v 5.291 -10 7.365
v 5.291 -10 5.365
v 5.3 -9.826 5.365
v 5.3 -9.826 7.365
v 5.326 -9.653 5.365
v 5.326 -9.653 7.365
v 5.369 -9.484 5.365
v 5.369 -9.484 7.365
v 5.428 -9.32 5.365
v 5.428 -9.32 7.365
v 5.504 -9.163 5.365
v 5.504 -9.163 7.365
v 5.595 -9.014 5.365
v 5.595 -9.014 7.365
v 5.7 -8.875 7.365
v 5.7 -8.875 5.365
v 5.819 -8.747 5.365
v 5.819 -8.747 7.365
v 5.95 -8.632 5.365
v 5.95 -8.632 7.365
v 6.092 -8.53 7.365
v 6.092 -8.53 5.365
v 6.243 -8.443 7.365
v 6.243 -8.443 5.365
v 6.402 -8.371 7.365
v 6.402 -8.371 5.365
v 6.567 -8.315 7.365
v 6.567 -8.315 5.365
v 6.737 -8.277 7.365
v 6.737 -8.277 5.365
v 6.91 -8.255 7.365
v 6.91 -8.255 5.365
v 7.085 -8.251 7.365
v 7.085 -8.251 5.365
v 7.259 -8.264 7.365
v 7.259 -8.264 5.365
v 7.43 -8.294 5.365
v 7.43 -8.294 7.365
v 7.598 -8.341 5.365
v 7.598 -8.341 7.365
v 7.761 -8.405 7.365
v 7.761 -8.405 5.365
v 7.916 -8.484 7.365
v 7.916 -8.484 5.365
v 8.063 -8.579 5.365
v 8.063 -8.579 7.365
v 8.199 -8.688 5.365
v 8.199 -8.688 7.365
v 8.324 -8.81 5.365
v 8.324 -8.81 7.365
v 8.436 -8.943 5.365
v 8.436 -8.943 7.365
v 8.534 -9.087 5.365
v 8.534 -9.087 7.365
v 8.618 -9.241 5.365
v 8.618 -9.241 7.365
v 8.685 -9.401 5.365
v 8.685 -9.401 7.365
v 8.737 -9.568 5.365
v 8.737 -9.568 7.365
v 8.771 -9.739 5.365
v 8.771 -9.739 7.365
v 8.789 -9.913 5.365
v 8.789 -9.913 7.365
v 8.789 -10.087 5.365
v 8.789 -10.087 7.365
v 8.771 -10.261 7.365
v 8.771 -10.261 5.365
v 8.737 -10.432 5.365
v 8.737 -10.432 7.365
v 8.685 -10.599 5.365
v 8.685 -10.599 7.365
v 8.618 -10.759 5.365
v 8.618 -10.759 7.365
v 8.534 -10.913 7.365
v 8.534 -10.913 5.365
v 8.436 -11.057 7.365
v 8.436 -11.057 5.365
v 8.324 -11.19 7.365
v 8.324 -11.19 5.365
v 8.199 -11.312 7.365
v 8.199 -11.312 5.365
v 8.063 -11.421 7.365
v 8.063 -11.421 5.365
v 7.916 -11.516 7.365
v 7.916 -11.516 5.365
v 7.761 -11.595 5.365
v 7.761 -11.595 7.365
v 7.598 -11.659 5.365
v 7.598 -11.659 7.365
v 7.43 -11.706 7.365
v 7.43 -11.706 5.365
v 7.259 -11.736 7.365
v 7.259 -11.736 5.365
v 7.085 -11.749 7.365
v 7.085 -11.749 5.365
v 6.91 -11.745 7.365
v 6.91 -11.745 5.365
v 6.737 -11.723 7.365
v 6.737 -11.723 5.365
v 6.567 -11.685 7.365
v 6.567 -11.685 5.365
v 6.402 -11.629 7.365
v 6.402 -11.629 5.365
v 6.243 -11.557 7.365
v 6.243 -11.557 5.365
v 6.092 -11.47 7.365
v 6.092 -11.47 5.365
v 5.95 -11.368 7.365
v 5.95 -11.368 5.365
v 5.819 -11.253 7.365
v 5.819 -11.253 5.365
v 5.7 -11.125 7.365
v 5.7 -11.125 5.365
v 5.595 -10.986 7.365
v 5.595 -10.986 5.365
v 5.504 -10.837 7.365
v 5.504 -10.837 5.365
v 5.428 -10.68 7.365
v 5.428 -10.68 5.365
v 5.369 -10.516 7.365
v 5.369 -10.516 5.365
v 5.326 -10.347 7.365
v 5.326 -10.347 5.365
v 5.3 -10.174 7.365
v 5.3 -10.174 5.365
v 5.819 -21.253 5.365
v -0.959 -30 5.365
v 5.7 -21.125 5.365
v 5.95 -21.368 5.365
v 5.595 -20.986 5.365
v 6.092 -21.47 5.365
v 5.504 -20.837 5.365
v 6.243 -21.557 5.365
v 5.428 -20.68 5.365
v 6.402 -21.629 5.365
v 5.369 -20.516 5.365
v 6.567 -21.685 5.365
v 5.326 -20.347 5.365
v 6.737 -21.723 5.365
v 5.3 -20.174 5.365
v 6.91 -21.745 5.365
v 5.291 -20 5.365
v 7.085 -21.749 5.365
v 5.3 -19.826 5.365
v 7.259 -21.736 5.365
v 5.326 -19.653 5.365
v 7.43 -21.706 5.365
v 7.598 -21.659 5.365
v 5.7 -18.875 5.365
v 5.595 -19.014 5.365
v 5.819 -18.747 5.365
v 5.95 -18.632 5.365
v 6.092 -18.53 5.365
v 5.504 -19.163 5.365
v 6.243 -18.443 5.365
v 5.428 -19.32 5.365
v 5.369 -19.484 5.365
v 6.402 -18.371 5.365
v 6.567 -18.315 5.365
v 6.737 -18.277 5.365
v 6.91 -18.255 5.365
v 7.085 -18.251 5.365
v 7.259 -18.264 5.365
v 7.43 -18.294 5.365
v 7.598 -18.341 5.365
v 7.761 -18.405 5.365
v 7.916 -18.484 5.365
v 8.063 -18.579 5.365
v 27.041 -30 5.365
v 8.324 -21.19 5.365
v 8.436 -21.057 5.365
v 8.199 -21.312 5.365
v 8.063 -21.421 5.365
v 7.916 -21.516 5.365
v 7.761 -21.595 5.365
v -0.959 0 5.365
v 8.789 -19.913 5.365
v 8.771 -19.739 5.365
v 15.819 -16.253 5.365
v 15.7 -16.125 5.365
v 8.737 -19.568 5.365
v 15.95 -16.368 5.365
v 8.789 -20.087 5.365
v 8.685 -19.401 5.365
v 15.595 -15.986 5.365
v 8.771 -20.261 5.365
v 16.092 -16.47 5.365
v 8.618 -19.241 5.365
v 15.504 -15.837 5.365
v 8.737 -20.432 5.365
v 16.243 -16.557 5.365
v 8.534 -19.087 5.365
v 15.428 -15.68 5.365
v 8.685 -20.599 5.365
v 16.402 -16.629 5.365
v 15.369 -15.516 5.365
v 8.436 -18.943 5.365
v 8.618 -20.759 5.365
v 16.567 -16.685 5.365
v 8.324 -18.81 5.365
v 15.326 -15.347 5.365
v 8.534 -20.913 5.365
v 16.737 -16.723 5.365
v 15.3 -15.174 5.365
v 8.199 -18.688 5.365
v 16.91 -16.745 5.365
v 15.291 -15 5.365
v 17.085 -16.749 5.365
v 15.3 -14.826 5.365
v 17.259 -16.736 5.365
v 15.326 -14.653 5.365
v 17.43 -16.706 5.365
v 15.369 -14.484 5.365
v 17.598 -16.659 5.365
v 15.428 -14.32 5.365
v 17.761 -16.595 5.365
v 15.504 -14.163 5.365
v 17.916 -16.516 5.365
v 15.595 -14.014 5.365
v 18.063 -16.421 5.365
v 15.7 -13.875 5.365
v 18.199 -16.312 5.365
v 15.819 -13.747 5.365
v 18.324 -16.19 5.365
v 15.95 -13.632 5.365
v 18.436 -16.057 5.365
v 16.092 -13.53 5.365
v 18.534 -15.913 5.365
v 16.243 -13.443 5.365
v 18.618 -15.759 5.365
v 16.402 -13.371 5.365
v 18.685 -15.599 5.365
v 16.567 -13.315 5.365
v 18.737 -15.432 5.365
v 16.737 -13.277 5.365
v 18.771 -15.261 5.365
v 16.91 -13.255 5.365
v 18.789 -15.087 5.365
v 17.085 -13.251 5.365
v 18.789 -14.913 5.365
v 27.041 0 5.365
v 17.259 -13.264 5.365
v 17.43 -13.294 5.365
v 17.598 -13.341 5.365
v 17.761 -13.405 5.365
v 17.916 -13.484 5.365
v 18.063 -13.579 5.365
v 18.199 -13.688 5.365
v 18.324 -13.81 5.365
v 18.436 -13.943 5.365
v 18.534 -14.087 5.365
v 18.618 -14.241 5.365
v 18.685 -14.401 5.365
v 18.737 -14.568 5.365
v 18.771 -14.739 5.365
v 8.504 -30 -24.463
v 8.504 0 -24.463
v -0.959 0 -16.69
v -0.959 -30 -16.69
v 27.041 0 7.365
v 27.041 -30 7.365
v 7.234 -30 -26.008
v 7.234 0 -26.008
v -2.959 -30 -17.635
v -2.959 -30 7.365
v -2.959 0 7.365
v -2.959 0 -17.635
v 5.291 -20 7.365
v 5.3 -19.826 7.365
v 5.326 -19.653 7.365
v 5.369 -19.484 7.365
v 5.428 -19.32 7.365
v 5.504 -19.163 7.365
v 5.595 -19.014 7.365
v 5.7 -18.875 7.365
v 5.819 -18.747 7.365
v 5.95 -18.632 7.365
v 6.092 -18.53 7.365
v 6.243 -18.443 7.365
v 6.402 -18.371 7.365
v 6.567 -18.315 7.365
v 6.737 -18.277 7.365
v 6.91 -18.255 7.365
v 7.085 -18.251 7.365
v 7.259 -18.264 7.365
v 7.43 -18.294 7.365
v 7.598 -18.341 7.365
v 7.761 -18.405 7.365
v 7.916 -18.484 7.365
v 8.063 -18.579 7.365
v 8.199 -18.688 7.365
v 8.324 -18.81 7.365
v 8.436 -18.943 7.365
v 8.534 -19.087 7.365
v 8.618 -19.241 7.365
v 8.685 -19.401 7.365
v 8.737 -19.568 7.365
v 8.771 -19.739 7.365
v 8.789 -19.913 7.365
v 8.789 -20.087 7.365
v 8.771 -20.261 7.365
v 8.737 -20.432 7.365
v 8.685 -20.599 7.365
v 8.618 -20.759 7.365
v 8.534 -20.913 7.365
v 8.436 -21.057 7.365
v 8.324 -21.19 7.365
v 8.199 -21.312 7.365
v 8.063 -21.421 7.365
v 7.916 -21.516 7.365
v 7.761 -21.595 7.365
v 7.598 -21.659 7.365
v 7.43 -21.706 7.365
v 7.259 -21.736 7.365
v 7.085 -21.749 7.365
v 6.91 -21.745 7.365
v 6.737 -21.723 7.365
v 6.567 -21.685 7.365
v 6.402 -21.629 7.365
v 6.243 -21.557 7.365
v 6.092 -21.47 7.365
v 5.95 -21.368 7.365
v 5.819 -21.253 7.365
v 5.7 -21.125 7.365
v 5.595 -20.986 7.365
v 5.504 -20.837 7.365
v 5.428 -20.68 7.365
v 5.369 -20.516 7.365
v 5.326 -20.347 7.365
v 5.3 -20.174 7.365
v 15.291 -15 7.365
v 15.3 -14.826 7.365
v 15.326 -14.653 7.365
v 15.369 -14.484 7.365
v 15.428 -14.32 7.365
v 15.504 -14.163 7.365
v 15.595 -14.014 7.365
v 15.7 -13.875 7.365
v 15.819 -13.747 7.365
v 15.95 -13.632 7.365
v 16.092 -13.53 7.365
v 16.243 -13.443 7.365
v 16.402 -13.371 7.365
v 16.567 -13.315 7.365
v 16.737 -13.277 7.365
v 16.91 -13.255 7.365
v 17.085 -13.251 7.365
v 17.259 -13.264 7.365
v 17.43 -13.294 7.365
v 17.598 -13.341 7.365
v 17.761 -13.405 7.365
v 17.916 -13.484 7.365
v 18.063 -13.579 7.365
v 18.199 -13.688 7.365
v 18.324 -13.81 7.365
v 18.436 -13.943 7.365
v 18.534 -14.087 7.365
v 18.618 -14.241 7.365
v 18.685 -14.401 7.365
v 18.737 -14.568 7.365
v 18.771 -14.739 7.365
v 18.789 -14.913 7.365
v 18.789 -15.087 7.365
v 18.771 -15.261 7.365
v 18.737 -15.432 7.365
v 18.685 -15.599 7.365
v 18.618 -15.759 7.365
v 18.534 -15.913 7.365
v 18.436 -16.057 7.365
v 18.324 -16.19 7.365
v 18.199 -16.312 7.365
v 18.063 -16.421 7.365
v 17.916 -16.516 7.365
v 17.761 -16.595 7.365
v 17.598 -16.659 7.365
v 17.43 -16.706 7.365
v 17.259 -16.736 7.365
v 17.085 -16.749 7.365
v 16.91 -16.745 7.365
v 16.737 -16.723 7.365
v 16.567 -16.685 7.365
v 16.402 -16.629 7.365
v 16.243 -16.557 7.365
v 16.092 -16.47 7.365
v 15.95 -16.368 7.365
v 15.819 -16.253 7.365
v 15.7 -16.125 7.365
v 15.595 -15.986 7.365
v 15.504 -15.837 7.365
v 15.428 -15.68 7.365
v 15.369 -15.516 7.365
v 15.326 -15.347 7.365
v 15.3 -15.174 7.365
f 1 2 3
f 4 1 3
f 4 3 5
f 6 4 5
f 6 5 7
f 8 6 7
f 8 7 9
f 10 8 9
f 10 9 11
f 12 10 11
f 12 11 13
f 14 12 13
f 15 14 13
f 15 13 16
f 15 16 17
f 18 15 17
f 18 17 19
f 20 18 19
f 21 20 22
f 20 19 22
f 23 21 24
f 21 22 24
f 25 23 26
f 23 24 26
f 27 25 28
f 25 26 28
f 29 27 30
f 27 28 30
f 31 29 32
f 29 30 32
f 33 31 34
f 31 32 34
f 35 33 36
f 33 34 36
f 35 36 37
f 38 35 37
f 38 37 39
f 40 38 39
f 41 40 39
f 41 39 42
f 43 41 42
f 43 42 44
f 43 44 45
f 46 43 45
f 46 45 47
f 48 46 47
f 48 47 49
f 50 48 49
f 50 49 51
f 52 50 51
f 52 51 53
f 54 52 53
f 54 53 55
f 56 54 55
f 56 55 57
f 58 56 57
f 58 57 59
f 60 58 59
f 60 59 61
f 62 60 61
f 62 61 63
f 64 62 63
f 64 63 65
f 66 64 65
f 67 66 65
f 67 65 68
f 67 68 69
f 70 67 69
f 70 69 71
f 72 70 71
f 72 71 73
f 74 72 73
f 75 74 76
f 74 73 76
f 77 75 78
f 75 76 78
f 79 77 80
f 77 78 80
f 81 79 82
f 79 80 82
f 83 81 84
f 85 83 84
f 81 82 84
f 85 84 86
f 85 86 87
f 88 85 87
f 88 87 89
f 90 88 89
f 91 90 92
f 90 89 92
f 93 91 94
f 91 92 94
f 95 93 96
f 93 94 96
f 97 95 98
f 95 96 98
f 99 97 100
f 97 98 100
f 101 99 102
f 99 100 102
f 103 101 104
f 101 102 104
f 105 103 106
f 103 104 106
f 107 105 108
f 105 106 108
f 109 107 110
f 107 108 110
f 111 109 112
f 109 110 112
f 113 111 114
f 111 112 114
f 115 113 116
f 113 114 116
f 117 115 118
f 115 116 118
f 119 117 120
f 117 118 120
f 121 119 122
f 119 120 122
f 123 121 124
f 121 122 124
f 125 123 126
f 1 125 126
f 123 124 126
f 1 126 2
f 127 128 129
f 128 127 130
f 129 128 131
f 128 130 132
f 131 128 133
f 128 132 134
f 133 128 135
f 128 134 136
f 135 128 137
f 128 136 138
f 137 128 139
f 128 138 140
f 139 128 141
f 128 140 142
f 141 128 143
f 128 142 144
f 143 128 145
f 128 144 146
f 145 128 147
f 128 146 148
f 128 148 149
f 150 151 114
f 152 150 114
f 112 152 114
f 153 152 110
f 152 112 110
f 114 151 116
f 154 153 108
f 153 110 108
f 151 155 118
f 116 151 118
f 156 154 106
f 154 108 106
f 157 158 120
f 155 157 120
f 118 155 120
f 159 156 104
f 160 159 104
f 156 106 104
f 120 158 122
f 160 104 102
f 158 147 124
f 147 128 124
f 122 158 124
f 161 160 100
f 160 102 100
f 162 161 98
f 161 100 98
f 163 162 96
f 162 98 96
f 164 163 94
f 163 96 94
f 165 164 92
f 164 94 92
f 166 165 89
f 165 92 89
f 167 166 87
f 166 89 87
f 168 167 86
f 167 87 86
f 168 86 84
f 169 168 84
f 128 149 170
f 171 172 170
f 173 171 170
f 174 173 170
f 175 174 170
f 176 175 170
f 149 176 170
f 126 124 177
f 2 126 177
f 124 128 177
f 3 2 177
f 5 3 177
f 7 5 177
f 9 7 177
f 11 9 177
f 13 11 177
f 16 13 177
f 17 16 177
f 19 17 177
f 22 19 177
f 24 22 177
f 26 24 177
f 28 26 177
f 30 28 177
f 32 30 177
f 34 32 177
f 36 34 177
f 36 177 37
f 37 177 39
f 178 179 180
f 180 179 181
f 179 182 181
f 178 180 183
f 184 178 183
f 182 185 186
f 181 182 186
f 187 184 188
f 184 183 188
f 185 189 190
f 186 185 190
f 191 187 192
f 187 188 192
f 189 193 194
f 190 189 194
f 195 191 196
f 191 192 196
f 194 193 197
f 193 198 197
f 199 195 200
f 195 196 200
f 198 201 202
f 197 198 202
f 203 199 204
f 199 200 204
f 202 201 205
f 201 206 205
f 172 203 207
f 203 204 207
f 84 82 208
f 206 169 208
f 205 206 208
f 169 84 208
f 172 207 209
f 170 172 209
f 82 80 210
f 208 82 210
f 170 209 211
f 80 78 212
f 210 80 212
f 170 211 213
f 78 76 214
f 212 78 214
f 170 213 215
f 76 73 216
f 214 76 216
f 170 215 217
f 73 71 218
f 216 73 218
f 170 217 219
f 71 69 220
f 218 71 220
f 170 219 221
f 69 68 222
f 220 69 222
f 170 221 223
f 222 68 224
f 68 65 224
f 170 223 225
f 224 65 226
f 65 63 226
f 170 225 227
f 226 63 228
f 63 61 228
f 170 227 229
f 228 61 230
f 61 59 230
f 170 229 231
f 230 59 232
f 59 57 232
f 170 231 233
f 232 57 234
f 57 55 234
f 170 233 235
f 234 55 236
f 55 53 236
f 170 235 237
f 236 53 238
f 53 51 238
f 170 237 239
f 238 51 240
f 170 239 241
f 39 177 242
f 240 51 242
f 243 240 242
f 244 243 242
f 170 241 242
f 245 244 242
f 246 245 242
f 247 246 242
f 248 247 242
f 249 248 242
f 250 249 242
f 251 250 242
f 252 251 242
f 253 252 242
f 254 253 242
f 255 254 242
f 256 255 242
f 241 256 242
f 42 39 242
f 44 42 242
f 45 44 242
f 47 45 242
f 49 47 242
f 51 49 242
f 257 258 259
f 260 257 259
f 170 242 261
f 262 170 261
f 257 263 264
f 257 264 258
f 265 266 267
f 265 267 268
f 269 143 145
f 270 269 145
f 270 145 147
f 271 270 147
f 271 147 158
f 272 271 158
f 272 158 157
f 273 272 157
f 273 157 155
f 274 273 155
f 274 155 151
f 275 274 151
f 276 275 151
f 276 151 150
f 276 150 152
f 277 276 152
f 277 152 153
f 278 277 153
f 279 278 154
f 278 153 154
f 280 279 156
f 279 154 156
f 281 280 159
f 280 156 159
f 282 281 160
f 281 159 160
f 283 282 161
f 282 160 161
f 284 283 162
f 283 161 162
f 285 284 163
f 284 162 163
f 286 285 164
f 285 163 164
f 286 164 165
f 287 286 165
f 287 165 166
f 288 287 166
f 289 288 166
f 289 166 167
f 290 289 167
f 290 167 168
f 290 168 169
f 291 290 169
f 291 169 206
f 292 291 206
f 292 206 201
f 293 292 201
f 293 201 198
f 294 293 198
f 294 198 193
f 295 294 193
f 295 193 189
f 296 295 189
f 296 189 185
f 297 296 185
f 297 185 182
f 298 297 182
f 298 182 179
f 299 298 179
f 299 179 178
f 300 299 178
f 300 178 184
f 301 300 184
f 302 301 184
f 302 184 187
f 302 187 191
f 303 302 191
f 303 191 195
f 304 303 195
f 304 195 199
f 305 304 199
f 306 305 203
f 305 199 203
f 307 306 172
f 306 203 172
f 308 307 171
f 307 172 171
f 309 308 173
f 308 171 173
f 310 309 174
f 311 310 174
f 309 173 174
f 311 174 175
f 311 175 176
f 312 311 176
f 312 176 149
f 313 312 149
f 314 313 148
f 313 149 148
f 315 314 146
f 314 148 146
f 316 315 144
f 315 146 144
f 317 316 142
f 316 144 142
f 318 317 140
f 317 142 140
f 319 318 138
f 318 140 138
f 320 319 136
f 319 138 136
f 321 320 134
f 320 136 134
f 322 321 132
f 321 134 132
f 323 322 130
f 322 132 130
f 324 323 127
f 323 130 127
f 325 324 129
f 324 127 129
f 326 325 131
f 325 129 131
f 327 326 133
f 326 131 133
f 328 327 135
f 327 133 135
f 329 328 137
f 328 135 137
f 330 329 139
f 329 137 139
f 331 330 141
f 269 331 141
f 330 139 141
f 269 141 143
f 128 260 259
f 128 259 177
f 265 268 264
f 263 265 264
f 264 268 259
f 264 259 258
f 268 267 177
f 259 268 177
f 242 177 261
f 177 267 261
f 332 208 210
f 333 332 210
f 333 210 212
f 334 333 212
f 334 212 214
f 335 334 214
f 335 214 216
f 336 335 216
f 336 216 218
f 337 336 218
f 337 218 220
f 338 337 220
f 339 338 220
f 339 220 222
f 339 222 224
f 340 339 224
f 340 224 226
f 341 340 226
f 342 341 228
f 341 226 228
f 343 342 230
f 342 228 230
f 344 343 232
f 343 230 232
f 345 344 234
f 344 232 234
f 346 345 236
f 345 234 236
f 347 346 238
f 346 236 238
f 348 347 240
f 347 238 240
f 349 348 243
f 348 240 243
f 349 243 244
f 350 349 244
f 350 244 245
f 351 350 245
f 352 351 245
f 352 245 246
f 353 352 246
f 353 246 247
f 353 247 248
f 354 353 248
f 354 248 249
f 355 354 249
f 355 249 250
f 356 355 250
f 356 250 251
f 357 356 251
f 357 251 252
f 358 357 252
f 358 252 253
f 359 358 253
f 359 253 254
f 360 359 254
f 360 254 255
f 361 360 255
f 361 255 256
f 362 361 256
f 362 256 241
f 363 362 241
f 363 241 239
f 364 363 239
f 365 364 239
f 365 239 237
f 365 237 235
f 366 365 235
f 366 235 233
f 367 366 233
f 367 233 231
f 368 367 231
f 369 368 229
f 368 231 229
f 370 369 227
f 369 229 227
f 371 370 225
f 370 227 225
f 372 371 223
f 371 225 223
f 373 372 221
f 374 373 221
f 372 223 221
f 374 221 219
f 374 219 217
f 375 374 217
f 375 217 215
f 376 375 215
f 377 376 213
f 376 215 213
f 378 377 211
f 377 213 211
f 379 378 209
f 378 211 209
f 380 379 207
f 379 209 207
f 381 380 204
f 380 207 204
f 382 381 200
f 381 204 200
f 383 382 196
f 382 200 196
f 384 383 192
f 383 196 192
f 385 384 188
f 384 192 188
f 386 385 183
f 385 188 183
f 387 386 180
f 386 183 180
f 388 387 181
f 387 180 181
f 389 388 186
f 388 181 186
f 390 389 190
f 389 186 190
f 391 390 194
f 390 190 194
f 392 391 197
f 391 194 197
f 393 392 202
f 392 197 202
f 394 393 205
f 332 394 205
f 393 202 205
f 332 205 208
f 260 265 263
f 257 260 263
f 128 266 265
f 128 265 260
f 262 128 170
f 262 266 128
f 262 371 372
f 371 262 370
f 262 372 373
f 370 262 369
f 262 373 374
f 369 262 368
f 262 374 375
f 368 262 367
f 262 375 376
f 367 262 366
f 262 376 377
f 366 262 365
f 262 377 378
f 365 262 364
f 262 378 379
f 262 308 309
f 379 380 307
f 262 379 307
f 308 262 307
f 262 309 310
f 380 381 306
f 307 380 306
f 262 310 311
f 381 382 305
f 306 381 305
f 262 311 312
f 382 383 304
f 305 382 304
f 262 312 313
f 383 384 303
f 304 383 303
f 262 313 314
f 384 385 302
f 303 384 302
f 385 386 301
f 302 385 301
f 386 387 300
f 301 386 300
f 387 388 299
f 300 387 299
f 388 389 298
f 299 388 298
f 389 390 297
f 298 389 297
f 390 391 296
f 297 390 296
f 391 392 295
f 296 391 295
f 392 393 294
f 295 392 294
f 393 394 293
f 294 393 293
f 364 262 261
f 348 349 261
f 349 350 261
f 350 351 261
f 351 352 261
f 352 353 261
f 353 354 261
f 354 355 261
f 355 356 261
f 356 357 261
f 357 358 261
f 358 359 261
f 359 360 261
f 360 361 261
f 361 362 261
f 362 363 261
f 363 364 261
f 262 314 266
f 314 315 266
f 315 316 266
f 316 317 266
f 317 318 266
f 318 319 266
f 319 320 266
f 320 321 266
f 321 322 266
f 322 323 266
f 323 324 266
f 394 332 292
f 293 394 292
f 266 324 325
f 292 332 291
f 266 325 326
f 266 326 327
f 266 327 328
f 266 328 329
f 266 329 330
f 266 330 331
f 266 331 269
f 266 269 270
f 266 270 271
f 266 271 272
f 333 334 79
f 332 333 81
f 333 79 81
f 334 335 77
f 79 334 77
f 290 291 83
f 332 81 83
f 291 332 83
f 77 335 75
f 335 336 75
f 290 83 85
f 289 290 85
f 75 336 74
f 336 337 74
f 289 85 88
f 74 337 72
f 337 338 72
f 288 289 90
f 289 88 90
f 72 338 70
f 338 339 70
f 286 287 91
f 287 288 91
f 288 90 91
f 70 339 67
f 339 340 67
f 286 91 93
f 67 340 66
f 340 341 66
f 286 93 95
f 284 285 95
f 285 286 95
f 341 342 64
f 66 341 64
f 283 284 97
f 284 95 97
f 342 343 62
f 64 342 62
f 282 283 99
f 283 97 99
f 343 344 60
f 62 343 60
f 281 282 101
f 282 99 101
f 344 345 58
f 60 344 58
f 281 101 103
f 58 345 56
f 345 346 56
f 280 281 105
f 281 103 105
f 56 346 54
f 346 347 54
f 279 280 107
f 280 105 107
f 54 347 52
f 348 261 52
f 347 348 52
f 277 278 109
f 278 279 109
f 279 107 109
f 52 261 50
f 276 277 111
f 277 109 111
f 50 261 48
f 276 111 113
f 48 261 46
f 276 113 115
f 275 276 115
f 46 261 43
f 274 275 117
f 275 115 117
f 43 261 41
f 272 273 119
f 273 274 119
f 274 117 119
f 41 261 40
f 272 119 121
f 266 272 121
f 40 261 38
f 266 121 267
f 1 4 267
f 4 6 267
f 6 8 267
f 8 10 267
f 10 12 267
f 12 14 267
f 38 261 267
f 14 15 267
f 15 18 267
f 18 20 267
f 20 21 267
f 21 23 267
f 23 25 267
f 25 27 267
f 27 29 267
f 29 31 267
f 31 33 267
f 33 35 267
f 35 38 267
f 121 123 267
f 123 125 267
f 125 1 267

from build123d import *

# Parameters (mm, degrees)
F1_DEPTH = 30
F3_D     = 3.5
F3_DEPTH = 5


with BuildPart() as f1:
    # F0 (on Front) → F1 (new body)
    with BuildSketch(Plane.XZ):
        Polygon((27.040993, 7.364779), (-2.959007, 7.364779), (-2.959007, -17.635221), (7.234091, -26.008121), (8.50357, -24.462669), (-0.959007, -16.689839), (-0.959007, 5.364779), (27.040993, 5.364779), align=None)
    extrude(amount=F1_DEPTH)

    # F3
    with Locations(Plane.XY.offset(7.364779)):
        with Locations((7.040993, -10), (17.040993, -15), (7.040993, -20)):
            Hole(F3_D / 2, depth=F3_DEPTH)


solid = f1.part
